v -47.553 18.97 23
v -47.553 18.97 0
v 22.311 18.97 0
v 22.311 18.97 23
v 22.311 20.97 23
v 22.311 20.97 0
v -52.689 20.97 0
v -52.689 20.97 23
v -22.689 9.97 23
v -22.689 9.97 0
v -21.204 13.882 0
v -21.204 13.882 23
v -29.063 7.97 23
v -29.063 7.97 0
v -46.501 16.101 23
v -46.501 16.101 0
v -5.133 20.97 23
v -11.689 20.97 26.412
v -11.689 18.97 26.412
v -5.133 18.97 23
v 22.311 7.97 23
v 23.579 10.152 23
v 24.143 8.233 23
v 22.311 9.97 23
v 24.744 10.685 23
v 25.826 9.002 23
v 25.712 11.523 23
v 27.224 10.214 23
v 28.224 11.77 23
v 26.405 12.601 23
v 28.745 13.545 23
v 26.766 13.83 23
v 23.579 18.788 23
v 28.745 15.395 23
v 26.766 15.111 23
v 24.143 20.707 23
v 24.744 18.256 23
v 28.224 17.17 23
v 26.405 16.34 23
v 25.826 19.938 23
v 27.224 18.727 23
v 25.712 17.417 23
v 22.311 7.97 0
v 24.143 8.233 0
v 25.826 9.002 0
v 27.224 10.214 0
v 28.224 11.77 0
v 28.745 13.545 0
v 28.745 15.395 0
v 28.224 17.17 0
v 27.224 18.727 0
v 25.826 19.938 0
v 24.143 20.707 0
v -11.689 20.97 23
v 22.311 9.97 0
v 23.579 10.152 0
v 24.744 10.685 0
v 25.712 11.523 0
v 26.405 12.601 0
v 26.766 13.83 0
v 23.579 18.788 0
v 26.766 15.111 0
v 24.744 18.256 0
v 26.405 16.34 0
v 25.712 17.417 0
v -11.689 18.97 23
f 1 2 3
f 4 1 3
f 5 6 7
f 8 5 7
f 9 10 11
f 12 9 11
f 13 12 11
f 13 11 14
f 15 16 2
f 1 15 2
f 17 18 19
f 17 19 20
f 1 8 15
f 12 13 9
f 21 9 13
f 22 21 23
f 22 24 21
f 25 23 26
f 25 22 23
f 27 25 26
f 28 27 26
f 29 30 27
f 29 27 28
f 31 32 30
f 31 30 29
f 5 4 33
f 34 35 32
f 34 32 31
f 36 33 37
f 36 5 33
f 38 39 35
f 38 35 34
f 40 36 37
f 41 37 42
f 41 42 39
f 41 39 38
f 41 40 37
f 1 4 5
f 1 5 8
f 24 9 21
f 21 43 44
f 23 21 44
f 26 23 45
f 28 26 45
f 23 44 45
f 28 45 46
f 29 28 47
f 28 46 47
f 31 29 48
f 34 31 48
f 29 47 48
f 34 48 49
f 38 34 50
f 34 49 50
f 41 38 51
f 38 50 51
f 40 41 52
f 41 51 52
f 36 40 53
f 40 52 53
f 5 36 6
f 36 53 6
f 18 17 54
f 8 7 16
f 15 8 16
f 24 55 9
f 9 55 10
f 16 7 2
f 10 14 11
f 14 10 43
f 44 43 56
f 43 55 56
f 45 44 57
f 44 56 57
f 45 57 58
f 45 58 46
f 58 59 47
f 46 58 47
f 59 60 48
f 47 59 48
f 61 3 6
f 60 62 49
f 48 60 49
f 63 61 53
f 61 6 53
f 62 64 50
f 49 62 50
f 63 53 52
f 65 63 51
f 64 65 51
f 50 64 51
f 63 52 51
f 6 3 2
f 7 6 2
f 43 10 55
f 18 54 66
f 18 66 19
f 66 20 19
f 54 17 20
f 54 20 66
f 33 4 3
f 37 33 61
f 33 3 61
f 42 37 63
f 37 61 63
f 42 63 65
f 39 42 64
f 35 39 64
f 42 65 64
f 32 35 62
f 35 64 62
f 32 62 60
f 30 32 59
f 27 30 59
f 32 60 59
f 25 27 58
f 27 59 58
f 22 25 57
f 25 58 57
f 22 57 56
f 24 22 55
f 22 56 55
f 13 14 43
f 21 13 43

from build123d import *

# Parameters (mm, degrees)
F1_DEPTH = 23
F3_DEPTH = 2


with BuildPart() as f1:
    # F0 (on Top) → F1 (new body)
    with BuildSketch(Plane.XY):
        with BuildLine():
            Line((-46.50076, 16.101427), (-47.552661, 18.970158))
            Line((-47.552661, 18.970158), (22.311499, 18.970158))
            ThreePointArc((22.311499, 18.970158), (26.811499, 14.470158), (22.311499, 9.970158))
            Line((22.311499, 9.970158), (-22.688501, 9.970158))
            Line((-22.688501, 9.970158), (-21.203749, 13.881953))
            Line((-21.203749, 13.881953), (-29.062928, 7.970158))
            Line((-29.062928, 7.970158), (22.311499, 7.970158))
            ThreePointArc((22.311499, 7.970158), (28.811499, 14.470158), (22.311499, 20.970158))
            Line((22.311499, 20.970158), (-52.688501, 20.970158))
            Line((-52.688501, 20.970158), (-46.50076, 16.101427))
        make_face()
    extrude(amount=F1_DEPTH)


with BuildPart() as f3:
    # F2 (on face) → F3 (new body)
    with BuildSketch(Plane(origin=(0, 20.970158, 0), x_dir=(-1, 0, 0), z_dir=(0, 1, 0))):
        Polygon((5.132779, 23), (11.688501, 23), (11.688501, 26.411502), align=None)
    extrude(amount=-F3_DEPTH)


solid = Compound([f1.part, f3.part])
